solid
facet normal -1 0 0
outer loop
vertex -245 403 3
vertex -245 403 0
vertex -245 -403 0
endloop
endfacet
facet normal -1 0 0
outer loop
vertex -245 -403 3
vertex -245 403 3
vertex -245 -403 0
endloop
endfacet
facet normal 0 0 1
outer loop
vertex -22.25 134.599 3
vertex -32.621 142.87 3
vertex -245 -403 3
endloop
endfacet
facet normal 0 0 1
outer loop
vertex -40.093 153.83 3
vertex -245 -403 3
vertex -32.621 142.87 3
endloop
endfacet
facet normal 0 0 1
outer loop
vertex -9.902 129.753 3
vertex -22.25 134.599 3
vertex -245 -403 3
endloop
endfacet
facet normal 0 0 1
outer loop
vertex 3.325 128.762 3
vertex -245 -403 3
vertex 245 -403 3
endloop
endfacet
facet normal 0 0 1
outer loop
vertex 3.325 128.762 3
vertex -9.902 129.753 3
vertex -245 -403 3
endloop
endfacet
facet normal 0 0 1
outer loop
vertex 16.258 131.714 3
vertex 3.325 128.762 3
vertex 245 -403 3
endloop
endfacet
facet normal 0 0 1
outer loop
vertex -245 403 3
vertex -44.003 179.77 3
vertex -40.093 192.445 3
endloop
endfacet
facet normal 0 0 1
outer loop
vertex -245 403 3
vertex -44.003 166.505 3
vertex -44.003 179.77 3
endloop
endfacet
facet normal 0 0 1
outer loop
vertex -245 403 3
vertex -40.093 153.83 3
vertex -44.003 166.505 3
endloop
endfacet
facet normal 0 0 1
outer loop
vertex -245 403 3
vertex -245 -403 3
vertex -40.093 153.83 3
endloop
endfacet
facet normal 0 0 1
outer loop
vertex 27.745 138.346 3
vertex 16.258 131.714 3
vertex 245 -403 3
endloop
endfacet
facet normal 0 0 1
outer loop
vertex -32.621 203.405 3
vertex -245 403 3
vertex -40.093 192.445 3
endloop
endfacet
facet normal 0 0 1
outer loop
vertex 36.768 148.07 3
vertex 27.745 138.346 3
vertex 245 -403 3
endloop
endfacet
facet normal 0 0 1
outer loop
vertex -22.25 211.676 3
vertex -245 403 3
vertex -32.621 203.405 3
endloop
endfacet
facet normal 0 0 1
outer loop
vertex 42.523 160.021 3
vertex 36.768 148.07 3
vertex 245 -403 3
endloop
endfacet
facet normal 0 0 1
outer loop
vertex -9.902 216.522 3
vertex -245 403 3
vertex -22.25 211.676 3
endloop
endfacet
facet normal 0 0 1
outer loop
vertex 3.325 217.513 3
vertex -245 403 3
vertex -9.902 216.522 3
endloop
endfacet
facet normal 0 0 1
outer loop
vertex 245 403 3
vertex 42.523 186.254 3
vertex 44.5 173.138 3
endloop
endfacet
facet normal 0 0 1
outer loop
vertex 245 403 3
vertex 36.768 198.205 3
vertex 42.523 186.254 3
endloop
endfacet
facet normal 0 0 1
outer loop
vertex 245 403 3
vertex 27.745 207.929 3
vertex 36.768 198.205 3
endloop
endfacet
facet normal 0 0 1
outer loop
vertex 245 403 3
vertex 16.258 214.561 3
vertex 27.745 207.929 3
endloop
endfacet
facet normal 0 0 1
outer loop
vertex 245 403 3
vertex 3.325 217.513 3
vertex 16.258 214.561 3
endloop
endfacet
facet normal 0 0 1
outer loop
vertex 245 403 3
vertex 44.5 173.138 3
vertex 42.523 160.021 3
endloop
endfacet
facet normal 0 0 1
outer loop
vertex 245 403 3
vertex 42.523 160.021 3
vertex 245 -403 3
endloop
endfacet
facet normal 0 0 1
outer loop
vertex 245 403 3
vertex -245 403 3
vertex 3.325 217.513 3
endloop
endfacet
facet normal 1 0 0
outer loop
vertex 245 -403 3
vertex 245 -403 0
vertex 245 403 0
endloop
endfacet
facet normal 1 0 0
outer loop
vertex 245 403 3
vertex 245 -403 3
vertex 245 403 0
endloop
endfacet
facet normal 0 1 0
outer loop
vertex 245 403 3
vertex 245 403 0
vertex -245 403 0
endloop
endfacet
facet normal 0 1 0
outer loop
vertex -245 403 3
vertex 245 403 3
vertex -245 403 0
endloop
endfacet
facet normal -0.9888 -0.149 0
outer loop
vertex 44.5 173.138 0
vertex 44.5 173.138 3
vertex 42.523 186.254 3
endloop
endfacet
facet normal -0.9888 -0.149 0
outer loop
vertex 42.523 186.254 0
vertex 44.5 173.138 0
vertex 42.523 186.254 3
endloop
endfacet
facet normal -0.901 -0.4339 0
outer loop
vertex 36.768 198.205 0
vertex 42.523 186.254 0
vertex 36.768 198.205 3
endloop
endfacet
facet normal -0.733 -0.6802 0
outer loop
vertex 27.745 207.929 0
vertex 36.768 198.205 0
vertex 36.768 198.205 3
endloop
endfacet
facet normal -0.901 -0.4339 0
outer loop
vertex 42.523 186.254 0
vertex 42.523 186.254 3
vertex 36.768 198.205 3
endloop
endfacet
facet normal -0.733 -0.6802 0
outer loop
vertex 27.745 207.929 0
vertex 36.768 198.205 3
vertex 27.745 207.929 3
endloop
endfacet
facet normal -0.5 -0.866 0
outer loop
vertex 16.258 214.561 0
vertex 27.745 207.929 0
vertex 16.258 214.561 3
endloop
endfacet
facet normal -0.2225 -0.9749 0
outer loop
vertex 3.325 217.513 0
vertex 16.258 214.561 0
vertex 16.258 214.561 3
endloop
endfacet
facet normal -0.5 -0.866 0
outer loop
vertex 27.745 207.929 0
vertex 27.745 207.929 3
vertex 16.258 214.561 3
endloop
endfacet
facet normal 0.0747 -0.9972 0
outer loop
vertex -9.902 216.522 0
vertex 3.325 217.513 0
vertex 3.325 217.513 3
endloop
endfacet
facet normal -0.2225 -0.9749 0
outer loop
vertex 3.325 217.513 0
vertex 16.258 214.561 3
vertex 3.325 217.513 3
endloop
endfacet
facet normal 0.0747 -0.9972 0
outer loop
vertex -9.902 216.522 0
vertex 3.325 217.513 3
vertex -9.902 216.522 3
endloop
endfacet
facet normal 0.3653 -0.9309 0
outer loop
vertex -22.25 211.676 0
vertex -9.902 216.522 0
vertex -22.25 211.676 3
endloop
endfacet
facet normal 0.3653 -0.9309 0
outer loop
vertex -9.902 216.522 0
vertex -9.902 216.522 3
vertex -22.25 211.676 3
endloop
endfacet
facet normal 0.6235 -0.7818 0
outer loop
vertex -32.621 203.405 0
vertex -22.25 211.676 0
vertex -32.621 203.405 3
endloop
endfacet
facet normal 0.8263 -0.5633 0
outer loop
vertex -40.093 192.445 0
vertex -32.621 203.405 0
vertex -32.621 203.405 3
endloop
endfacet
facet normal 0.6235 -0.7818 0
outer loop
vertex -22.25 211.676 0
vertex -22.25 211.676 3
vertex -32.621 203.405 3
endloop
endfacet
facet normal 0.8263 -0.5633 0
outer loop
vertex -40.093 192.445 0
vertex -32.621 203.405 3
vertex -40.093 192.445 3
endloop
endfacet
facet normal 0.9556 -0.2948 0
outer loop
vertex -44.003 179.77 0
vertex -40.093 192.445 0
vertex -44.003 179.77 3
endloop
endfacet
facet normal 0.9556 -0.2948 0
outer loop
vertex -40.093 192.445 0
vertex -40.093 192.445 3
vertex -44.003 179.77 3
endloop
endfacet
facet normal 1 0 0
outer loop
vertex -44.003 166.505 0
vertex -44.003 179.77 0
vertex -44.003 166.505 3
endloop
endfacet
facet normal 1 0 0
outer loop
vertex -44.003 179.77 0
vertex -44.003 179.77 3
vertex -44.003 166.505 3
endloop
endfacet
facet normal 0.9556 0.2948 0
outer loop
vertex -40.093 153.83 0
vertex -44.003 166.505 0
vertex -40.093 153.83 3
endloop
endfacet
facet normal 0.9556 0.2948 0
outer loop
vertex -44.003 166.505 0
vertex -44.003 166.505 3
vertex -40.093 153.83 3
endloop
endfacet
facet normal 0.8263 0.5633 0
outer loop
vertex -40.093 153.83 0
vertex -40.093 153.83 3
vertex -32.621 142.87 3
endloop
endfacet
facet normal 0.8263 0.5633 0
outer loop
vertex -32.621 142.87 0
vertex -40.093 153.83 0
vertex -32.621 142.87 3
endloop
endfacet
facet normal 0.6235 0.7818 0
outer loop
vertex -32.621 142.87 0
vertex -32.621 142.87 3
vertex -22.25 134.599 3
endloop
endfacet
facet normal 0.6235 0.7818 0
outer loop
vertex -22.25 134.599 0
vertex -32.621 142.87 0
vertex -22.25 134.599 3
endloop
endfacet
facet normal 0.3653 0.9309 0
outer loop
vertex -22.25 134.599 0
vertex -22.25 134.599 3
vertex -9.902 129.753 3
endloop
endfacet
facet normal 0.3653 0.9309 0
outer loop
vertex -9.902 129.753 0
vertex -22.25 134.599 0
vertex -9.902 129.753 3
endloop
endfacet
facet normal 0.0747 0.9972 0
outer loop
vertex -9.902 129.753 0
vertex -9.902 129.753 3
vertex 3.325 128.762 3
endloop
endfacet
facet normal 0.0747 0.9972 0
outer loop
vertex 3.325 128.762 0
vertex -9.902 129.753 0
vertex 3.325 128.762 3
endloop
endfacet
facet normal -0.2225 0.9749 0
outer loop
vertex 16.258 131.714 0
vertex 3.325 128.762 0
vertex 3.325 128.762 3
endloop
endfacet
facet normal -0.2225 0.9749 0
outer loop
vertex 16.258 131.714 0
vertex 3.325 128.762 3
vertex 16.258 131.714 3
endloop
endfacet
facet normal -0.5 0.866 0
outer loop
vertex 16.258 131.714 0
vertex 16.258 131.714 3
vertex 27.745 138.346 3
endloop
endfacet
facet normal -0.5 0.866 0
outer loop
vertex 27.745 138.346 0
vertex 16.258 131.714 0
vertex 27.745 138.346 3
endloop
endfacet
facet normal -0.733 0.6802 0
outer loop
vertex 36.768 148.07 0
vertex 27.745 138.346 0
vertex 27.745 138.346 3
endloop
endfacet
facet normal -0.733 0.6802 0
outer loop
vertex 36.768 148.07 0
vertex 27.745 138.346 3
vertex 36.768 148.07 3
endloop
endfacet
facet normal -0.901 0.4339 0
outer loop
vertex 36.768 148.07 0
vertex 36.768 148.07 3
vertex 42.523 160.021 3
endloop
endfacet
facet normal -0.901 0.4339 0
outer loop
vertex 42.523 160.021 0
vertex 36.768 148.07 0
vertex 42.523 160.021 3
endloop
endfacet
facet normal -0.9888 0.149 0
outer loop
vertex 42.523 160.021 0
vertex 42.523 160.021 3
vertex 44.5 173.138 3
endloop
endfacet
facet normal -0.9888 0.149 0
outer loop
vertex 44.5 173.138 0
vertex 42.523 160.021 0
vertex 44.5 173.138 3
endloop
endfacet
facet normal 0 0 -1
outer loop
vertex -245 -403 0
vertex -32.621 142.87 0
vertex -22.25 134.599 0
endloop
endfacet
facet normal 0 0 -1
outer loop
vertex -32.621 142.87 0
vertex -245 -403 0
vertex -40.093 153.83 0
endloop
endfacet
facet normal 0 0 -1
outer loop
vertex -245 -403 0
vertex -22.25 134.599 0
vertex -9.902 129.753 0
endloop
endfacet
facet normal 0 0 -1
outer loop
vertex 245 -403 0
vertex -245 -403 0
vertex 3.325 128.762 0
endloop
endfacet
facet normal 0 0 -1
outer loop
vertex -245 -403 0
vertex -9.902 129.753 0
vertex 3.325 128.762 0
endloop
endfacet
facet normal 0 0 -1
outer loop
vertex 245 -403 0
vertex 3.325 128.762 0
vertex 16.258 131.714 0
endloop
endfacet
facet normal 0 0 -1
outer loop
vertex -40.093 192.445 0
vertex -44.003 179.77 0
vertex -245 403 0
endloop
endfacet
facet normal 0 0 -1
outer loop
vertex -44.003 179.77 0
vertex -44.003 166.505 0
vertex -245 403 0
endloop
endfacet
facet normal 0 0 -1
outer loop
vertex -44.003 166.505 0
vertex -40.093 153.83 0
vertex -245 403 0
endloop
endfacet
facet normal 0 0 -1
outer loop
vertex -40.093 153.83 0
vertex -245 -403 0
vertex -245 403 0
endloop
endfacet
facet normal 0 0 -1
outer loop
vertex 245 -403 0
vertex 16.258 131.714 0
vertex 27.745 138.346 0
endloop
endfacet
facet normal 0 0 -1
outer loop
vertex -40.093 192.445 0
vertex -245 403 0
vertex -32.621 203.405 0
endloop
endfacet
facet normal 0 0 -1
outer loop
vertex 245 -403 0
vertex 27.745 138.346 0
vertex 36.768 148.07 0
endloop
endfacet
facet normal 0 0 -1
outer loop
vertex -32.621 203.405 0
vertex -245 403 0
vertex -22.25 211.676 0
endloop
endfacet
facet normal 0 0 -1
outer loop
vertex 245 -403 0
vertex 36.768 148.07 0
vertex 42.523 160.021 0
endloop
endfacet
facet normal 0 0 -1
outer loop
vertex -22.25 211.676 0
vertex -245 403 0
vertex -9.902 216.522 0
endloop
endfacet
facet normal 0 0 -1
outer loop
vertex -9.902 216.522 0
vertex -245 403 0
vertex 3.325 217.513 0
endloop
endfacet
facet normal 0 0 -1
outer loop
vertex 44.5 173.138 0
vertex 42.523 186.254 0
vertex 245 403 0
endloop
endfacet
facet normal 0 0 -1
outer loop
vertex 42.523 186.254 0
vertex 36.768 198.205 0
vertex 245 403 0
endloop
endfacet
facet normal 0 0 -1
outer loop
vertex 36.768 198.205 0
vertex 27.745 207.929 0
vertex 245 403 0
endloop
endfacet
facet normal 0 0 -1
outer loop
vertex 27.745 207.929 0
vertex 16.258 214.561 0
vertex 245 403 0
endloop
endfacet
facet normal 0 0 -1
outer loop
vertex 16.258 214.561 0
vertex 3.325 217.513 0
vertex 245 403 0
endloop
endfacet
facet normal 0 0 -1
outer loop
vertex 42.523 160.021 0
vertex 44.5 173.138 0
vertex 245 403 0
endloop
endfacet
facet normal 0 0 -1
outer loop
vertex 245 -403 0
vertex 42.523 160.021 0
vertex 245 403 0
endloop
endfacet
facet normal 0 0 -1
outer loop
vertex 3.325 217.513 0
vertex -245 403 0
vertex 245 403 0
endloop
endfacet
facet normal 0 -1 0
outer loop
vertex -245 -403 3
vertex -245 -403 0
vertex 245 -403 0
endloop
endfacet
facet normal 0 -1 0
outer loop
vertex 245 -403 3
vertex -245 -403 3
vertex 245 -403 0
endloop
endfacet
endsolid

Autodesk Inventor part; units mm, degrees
ref_plane "YZ Plane" through (0, 0, 0) normal (1, 0, 0) x (0, 1, 0)
ref_plane "XZ Plane" through (0, 0, 0) normal (0, 1, 0) x (-1, 0, 0)
ref_plane "XY Plane" through (0, 0, 0) normal (0, 0, 1) x (1, 0, 0)
sketch "Sketch1" plane through (0, 0, 0) normal (0, 0, 1) x (1, 0, 0)
  line L0 (-245, -403) -> (245, -403)
  line L1 (245, -403) -> (245, 403)
  line L2 (245, 403) -> (-245, 403)
  line L3 (-245, 403) -> (-245, -403)
  line L4 (-245, -403) -> (245, 403) construction
  line L5 (245, -403) -> (-245, 403) construction
  point P0 (0, 0)
  dimension "d0" = 490
  dimension "d1" = 806
extrude "Plate1" add sketch "Sketch1" along normal blind 3
sketch "Sketch2" plane through (0, 0, 0) normal (0, 0, -1) x (-1, 0, 0)
  line L0 (-245, 403) -> (245, 403) projected
  line L1 (-245, -403) -> (-245, 403) projected
  line L2 (-225, 383) -> (-25, 383) construction
  line L3 (-25, 383) -> (-25, 363) construction
  line L4 (-25, 363) -> (-225, 363) construction
  line L5 (-225, 363) -> (-225, 383) construction
  point P0 (0, 0)
  dimension "d8" = 200
  dimension "d9" = 20
  dimension "d10" = 20
  dimension "d11" = 20
mark "Mark3"
sketch "Sketch6" plane through (0, 0, 3) normal (0, 0, 1) x (1, 0, 0)
  circle A0 centre (0, 173.1375) radius 44.5
  point P0 (0, 0)
  dimension "d42" = 89
extrude "Cut1" cut sketch "Sketch6" against normal blind 3
equation "\"d43\" = Thickness"
equation "\"d2\" = Thickness"
equation "\"BendReliefWidth\" = Thickness"
equation "\"BendReliefDepth\" = 0.5 * Thickness"
equation "\"CornerReliefSize\" = 4 * Thickness"
equation "\"MinimumRemnant\" = 2 * Thickness"
equation "\"TransitionRadius\" = BendRadius"
equation "\"JacobiRadiusSize\" = BendRadius"
equation "\"GapSize\" = Thickness"
equation "\"Thickness\" = 3"
equation "\"BendRadius\" = 2.75"
properties part number "TRM 011 bottom main" material "AISI 304"
